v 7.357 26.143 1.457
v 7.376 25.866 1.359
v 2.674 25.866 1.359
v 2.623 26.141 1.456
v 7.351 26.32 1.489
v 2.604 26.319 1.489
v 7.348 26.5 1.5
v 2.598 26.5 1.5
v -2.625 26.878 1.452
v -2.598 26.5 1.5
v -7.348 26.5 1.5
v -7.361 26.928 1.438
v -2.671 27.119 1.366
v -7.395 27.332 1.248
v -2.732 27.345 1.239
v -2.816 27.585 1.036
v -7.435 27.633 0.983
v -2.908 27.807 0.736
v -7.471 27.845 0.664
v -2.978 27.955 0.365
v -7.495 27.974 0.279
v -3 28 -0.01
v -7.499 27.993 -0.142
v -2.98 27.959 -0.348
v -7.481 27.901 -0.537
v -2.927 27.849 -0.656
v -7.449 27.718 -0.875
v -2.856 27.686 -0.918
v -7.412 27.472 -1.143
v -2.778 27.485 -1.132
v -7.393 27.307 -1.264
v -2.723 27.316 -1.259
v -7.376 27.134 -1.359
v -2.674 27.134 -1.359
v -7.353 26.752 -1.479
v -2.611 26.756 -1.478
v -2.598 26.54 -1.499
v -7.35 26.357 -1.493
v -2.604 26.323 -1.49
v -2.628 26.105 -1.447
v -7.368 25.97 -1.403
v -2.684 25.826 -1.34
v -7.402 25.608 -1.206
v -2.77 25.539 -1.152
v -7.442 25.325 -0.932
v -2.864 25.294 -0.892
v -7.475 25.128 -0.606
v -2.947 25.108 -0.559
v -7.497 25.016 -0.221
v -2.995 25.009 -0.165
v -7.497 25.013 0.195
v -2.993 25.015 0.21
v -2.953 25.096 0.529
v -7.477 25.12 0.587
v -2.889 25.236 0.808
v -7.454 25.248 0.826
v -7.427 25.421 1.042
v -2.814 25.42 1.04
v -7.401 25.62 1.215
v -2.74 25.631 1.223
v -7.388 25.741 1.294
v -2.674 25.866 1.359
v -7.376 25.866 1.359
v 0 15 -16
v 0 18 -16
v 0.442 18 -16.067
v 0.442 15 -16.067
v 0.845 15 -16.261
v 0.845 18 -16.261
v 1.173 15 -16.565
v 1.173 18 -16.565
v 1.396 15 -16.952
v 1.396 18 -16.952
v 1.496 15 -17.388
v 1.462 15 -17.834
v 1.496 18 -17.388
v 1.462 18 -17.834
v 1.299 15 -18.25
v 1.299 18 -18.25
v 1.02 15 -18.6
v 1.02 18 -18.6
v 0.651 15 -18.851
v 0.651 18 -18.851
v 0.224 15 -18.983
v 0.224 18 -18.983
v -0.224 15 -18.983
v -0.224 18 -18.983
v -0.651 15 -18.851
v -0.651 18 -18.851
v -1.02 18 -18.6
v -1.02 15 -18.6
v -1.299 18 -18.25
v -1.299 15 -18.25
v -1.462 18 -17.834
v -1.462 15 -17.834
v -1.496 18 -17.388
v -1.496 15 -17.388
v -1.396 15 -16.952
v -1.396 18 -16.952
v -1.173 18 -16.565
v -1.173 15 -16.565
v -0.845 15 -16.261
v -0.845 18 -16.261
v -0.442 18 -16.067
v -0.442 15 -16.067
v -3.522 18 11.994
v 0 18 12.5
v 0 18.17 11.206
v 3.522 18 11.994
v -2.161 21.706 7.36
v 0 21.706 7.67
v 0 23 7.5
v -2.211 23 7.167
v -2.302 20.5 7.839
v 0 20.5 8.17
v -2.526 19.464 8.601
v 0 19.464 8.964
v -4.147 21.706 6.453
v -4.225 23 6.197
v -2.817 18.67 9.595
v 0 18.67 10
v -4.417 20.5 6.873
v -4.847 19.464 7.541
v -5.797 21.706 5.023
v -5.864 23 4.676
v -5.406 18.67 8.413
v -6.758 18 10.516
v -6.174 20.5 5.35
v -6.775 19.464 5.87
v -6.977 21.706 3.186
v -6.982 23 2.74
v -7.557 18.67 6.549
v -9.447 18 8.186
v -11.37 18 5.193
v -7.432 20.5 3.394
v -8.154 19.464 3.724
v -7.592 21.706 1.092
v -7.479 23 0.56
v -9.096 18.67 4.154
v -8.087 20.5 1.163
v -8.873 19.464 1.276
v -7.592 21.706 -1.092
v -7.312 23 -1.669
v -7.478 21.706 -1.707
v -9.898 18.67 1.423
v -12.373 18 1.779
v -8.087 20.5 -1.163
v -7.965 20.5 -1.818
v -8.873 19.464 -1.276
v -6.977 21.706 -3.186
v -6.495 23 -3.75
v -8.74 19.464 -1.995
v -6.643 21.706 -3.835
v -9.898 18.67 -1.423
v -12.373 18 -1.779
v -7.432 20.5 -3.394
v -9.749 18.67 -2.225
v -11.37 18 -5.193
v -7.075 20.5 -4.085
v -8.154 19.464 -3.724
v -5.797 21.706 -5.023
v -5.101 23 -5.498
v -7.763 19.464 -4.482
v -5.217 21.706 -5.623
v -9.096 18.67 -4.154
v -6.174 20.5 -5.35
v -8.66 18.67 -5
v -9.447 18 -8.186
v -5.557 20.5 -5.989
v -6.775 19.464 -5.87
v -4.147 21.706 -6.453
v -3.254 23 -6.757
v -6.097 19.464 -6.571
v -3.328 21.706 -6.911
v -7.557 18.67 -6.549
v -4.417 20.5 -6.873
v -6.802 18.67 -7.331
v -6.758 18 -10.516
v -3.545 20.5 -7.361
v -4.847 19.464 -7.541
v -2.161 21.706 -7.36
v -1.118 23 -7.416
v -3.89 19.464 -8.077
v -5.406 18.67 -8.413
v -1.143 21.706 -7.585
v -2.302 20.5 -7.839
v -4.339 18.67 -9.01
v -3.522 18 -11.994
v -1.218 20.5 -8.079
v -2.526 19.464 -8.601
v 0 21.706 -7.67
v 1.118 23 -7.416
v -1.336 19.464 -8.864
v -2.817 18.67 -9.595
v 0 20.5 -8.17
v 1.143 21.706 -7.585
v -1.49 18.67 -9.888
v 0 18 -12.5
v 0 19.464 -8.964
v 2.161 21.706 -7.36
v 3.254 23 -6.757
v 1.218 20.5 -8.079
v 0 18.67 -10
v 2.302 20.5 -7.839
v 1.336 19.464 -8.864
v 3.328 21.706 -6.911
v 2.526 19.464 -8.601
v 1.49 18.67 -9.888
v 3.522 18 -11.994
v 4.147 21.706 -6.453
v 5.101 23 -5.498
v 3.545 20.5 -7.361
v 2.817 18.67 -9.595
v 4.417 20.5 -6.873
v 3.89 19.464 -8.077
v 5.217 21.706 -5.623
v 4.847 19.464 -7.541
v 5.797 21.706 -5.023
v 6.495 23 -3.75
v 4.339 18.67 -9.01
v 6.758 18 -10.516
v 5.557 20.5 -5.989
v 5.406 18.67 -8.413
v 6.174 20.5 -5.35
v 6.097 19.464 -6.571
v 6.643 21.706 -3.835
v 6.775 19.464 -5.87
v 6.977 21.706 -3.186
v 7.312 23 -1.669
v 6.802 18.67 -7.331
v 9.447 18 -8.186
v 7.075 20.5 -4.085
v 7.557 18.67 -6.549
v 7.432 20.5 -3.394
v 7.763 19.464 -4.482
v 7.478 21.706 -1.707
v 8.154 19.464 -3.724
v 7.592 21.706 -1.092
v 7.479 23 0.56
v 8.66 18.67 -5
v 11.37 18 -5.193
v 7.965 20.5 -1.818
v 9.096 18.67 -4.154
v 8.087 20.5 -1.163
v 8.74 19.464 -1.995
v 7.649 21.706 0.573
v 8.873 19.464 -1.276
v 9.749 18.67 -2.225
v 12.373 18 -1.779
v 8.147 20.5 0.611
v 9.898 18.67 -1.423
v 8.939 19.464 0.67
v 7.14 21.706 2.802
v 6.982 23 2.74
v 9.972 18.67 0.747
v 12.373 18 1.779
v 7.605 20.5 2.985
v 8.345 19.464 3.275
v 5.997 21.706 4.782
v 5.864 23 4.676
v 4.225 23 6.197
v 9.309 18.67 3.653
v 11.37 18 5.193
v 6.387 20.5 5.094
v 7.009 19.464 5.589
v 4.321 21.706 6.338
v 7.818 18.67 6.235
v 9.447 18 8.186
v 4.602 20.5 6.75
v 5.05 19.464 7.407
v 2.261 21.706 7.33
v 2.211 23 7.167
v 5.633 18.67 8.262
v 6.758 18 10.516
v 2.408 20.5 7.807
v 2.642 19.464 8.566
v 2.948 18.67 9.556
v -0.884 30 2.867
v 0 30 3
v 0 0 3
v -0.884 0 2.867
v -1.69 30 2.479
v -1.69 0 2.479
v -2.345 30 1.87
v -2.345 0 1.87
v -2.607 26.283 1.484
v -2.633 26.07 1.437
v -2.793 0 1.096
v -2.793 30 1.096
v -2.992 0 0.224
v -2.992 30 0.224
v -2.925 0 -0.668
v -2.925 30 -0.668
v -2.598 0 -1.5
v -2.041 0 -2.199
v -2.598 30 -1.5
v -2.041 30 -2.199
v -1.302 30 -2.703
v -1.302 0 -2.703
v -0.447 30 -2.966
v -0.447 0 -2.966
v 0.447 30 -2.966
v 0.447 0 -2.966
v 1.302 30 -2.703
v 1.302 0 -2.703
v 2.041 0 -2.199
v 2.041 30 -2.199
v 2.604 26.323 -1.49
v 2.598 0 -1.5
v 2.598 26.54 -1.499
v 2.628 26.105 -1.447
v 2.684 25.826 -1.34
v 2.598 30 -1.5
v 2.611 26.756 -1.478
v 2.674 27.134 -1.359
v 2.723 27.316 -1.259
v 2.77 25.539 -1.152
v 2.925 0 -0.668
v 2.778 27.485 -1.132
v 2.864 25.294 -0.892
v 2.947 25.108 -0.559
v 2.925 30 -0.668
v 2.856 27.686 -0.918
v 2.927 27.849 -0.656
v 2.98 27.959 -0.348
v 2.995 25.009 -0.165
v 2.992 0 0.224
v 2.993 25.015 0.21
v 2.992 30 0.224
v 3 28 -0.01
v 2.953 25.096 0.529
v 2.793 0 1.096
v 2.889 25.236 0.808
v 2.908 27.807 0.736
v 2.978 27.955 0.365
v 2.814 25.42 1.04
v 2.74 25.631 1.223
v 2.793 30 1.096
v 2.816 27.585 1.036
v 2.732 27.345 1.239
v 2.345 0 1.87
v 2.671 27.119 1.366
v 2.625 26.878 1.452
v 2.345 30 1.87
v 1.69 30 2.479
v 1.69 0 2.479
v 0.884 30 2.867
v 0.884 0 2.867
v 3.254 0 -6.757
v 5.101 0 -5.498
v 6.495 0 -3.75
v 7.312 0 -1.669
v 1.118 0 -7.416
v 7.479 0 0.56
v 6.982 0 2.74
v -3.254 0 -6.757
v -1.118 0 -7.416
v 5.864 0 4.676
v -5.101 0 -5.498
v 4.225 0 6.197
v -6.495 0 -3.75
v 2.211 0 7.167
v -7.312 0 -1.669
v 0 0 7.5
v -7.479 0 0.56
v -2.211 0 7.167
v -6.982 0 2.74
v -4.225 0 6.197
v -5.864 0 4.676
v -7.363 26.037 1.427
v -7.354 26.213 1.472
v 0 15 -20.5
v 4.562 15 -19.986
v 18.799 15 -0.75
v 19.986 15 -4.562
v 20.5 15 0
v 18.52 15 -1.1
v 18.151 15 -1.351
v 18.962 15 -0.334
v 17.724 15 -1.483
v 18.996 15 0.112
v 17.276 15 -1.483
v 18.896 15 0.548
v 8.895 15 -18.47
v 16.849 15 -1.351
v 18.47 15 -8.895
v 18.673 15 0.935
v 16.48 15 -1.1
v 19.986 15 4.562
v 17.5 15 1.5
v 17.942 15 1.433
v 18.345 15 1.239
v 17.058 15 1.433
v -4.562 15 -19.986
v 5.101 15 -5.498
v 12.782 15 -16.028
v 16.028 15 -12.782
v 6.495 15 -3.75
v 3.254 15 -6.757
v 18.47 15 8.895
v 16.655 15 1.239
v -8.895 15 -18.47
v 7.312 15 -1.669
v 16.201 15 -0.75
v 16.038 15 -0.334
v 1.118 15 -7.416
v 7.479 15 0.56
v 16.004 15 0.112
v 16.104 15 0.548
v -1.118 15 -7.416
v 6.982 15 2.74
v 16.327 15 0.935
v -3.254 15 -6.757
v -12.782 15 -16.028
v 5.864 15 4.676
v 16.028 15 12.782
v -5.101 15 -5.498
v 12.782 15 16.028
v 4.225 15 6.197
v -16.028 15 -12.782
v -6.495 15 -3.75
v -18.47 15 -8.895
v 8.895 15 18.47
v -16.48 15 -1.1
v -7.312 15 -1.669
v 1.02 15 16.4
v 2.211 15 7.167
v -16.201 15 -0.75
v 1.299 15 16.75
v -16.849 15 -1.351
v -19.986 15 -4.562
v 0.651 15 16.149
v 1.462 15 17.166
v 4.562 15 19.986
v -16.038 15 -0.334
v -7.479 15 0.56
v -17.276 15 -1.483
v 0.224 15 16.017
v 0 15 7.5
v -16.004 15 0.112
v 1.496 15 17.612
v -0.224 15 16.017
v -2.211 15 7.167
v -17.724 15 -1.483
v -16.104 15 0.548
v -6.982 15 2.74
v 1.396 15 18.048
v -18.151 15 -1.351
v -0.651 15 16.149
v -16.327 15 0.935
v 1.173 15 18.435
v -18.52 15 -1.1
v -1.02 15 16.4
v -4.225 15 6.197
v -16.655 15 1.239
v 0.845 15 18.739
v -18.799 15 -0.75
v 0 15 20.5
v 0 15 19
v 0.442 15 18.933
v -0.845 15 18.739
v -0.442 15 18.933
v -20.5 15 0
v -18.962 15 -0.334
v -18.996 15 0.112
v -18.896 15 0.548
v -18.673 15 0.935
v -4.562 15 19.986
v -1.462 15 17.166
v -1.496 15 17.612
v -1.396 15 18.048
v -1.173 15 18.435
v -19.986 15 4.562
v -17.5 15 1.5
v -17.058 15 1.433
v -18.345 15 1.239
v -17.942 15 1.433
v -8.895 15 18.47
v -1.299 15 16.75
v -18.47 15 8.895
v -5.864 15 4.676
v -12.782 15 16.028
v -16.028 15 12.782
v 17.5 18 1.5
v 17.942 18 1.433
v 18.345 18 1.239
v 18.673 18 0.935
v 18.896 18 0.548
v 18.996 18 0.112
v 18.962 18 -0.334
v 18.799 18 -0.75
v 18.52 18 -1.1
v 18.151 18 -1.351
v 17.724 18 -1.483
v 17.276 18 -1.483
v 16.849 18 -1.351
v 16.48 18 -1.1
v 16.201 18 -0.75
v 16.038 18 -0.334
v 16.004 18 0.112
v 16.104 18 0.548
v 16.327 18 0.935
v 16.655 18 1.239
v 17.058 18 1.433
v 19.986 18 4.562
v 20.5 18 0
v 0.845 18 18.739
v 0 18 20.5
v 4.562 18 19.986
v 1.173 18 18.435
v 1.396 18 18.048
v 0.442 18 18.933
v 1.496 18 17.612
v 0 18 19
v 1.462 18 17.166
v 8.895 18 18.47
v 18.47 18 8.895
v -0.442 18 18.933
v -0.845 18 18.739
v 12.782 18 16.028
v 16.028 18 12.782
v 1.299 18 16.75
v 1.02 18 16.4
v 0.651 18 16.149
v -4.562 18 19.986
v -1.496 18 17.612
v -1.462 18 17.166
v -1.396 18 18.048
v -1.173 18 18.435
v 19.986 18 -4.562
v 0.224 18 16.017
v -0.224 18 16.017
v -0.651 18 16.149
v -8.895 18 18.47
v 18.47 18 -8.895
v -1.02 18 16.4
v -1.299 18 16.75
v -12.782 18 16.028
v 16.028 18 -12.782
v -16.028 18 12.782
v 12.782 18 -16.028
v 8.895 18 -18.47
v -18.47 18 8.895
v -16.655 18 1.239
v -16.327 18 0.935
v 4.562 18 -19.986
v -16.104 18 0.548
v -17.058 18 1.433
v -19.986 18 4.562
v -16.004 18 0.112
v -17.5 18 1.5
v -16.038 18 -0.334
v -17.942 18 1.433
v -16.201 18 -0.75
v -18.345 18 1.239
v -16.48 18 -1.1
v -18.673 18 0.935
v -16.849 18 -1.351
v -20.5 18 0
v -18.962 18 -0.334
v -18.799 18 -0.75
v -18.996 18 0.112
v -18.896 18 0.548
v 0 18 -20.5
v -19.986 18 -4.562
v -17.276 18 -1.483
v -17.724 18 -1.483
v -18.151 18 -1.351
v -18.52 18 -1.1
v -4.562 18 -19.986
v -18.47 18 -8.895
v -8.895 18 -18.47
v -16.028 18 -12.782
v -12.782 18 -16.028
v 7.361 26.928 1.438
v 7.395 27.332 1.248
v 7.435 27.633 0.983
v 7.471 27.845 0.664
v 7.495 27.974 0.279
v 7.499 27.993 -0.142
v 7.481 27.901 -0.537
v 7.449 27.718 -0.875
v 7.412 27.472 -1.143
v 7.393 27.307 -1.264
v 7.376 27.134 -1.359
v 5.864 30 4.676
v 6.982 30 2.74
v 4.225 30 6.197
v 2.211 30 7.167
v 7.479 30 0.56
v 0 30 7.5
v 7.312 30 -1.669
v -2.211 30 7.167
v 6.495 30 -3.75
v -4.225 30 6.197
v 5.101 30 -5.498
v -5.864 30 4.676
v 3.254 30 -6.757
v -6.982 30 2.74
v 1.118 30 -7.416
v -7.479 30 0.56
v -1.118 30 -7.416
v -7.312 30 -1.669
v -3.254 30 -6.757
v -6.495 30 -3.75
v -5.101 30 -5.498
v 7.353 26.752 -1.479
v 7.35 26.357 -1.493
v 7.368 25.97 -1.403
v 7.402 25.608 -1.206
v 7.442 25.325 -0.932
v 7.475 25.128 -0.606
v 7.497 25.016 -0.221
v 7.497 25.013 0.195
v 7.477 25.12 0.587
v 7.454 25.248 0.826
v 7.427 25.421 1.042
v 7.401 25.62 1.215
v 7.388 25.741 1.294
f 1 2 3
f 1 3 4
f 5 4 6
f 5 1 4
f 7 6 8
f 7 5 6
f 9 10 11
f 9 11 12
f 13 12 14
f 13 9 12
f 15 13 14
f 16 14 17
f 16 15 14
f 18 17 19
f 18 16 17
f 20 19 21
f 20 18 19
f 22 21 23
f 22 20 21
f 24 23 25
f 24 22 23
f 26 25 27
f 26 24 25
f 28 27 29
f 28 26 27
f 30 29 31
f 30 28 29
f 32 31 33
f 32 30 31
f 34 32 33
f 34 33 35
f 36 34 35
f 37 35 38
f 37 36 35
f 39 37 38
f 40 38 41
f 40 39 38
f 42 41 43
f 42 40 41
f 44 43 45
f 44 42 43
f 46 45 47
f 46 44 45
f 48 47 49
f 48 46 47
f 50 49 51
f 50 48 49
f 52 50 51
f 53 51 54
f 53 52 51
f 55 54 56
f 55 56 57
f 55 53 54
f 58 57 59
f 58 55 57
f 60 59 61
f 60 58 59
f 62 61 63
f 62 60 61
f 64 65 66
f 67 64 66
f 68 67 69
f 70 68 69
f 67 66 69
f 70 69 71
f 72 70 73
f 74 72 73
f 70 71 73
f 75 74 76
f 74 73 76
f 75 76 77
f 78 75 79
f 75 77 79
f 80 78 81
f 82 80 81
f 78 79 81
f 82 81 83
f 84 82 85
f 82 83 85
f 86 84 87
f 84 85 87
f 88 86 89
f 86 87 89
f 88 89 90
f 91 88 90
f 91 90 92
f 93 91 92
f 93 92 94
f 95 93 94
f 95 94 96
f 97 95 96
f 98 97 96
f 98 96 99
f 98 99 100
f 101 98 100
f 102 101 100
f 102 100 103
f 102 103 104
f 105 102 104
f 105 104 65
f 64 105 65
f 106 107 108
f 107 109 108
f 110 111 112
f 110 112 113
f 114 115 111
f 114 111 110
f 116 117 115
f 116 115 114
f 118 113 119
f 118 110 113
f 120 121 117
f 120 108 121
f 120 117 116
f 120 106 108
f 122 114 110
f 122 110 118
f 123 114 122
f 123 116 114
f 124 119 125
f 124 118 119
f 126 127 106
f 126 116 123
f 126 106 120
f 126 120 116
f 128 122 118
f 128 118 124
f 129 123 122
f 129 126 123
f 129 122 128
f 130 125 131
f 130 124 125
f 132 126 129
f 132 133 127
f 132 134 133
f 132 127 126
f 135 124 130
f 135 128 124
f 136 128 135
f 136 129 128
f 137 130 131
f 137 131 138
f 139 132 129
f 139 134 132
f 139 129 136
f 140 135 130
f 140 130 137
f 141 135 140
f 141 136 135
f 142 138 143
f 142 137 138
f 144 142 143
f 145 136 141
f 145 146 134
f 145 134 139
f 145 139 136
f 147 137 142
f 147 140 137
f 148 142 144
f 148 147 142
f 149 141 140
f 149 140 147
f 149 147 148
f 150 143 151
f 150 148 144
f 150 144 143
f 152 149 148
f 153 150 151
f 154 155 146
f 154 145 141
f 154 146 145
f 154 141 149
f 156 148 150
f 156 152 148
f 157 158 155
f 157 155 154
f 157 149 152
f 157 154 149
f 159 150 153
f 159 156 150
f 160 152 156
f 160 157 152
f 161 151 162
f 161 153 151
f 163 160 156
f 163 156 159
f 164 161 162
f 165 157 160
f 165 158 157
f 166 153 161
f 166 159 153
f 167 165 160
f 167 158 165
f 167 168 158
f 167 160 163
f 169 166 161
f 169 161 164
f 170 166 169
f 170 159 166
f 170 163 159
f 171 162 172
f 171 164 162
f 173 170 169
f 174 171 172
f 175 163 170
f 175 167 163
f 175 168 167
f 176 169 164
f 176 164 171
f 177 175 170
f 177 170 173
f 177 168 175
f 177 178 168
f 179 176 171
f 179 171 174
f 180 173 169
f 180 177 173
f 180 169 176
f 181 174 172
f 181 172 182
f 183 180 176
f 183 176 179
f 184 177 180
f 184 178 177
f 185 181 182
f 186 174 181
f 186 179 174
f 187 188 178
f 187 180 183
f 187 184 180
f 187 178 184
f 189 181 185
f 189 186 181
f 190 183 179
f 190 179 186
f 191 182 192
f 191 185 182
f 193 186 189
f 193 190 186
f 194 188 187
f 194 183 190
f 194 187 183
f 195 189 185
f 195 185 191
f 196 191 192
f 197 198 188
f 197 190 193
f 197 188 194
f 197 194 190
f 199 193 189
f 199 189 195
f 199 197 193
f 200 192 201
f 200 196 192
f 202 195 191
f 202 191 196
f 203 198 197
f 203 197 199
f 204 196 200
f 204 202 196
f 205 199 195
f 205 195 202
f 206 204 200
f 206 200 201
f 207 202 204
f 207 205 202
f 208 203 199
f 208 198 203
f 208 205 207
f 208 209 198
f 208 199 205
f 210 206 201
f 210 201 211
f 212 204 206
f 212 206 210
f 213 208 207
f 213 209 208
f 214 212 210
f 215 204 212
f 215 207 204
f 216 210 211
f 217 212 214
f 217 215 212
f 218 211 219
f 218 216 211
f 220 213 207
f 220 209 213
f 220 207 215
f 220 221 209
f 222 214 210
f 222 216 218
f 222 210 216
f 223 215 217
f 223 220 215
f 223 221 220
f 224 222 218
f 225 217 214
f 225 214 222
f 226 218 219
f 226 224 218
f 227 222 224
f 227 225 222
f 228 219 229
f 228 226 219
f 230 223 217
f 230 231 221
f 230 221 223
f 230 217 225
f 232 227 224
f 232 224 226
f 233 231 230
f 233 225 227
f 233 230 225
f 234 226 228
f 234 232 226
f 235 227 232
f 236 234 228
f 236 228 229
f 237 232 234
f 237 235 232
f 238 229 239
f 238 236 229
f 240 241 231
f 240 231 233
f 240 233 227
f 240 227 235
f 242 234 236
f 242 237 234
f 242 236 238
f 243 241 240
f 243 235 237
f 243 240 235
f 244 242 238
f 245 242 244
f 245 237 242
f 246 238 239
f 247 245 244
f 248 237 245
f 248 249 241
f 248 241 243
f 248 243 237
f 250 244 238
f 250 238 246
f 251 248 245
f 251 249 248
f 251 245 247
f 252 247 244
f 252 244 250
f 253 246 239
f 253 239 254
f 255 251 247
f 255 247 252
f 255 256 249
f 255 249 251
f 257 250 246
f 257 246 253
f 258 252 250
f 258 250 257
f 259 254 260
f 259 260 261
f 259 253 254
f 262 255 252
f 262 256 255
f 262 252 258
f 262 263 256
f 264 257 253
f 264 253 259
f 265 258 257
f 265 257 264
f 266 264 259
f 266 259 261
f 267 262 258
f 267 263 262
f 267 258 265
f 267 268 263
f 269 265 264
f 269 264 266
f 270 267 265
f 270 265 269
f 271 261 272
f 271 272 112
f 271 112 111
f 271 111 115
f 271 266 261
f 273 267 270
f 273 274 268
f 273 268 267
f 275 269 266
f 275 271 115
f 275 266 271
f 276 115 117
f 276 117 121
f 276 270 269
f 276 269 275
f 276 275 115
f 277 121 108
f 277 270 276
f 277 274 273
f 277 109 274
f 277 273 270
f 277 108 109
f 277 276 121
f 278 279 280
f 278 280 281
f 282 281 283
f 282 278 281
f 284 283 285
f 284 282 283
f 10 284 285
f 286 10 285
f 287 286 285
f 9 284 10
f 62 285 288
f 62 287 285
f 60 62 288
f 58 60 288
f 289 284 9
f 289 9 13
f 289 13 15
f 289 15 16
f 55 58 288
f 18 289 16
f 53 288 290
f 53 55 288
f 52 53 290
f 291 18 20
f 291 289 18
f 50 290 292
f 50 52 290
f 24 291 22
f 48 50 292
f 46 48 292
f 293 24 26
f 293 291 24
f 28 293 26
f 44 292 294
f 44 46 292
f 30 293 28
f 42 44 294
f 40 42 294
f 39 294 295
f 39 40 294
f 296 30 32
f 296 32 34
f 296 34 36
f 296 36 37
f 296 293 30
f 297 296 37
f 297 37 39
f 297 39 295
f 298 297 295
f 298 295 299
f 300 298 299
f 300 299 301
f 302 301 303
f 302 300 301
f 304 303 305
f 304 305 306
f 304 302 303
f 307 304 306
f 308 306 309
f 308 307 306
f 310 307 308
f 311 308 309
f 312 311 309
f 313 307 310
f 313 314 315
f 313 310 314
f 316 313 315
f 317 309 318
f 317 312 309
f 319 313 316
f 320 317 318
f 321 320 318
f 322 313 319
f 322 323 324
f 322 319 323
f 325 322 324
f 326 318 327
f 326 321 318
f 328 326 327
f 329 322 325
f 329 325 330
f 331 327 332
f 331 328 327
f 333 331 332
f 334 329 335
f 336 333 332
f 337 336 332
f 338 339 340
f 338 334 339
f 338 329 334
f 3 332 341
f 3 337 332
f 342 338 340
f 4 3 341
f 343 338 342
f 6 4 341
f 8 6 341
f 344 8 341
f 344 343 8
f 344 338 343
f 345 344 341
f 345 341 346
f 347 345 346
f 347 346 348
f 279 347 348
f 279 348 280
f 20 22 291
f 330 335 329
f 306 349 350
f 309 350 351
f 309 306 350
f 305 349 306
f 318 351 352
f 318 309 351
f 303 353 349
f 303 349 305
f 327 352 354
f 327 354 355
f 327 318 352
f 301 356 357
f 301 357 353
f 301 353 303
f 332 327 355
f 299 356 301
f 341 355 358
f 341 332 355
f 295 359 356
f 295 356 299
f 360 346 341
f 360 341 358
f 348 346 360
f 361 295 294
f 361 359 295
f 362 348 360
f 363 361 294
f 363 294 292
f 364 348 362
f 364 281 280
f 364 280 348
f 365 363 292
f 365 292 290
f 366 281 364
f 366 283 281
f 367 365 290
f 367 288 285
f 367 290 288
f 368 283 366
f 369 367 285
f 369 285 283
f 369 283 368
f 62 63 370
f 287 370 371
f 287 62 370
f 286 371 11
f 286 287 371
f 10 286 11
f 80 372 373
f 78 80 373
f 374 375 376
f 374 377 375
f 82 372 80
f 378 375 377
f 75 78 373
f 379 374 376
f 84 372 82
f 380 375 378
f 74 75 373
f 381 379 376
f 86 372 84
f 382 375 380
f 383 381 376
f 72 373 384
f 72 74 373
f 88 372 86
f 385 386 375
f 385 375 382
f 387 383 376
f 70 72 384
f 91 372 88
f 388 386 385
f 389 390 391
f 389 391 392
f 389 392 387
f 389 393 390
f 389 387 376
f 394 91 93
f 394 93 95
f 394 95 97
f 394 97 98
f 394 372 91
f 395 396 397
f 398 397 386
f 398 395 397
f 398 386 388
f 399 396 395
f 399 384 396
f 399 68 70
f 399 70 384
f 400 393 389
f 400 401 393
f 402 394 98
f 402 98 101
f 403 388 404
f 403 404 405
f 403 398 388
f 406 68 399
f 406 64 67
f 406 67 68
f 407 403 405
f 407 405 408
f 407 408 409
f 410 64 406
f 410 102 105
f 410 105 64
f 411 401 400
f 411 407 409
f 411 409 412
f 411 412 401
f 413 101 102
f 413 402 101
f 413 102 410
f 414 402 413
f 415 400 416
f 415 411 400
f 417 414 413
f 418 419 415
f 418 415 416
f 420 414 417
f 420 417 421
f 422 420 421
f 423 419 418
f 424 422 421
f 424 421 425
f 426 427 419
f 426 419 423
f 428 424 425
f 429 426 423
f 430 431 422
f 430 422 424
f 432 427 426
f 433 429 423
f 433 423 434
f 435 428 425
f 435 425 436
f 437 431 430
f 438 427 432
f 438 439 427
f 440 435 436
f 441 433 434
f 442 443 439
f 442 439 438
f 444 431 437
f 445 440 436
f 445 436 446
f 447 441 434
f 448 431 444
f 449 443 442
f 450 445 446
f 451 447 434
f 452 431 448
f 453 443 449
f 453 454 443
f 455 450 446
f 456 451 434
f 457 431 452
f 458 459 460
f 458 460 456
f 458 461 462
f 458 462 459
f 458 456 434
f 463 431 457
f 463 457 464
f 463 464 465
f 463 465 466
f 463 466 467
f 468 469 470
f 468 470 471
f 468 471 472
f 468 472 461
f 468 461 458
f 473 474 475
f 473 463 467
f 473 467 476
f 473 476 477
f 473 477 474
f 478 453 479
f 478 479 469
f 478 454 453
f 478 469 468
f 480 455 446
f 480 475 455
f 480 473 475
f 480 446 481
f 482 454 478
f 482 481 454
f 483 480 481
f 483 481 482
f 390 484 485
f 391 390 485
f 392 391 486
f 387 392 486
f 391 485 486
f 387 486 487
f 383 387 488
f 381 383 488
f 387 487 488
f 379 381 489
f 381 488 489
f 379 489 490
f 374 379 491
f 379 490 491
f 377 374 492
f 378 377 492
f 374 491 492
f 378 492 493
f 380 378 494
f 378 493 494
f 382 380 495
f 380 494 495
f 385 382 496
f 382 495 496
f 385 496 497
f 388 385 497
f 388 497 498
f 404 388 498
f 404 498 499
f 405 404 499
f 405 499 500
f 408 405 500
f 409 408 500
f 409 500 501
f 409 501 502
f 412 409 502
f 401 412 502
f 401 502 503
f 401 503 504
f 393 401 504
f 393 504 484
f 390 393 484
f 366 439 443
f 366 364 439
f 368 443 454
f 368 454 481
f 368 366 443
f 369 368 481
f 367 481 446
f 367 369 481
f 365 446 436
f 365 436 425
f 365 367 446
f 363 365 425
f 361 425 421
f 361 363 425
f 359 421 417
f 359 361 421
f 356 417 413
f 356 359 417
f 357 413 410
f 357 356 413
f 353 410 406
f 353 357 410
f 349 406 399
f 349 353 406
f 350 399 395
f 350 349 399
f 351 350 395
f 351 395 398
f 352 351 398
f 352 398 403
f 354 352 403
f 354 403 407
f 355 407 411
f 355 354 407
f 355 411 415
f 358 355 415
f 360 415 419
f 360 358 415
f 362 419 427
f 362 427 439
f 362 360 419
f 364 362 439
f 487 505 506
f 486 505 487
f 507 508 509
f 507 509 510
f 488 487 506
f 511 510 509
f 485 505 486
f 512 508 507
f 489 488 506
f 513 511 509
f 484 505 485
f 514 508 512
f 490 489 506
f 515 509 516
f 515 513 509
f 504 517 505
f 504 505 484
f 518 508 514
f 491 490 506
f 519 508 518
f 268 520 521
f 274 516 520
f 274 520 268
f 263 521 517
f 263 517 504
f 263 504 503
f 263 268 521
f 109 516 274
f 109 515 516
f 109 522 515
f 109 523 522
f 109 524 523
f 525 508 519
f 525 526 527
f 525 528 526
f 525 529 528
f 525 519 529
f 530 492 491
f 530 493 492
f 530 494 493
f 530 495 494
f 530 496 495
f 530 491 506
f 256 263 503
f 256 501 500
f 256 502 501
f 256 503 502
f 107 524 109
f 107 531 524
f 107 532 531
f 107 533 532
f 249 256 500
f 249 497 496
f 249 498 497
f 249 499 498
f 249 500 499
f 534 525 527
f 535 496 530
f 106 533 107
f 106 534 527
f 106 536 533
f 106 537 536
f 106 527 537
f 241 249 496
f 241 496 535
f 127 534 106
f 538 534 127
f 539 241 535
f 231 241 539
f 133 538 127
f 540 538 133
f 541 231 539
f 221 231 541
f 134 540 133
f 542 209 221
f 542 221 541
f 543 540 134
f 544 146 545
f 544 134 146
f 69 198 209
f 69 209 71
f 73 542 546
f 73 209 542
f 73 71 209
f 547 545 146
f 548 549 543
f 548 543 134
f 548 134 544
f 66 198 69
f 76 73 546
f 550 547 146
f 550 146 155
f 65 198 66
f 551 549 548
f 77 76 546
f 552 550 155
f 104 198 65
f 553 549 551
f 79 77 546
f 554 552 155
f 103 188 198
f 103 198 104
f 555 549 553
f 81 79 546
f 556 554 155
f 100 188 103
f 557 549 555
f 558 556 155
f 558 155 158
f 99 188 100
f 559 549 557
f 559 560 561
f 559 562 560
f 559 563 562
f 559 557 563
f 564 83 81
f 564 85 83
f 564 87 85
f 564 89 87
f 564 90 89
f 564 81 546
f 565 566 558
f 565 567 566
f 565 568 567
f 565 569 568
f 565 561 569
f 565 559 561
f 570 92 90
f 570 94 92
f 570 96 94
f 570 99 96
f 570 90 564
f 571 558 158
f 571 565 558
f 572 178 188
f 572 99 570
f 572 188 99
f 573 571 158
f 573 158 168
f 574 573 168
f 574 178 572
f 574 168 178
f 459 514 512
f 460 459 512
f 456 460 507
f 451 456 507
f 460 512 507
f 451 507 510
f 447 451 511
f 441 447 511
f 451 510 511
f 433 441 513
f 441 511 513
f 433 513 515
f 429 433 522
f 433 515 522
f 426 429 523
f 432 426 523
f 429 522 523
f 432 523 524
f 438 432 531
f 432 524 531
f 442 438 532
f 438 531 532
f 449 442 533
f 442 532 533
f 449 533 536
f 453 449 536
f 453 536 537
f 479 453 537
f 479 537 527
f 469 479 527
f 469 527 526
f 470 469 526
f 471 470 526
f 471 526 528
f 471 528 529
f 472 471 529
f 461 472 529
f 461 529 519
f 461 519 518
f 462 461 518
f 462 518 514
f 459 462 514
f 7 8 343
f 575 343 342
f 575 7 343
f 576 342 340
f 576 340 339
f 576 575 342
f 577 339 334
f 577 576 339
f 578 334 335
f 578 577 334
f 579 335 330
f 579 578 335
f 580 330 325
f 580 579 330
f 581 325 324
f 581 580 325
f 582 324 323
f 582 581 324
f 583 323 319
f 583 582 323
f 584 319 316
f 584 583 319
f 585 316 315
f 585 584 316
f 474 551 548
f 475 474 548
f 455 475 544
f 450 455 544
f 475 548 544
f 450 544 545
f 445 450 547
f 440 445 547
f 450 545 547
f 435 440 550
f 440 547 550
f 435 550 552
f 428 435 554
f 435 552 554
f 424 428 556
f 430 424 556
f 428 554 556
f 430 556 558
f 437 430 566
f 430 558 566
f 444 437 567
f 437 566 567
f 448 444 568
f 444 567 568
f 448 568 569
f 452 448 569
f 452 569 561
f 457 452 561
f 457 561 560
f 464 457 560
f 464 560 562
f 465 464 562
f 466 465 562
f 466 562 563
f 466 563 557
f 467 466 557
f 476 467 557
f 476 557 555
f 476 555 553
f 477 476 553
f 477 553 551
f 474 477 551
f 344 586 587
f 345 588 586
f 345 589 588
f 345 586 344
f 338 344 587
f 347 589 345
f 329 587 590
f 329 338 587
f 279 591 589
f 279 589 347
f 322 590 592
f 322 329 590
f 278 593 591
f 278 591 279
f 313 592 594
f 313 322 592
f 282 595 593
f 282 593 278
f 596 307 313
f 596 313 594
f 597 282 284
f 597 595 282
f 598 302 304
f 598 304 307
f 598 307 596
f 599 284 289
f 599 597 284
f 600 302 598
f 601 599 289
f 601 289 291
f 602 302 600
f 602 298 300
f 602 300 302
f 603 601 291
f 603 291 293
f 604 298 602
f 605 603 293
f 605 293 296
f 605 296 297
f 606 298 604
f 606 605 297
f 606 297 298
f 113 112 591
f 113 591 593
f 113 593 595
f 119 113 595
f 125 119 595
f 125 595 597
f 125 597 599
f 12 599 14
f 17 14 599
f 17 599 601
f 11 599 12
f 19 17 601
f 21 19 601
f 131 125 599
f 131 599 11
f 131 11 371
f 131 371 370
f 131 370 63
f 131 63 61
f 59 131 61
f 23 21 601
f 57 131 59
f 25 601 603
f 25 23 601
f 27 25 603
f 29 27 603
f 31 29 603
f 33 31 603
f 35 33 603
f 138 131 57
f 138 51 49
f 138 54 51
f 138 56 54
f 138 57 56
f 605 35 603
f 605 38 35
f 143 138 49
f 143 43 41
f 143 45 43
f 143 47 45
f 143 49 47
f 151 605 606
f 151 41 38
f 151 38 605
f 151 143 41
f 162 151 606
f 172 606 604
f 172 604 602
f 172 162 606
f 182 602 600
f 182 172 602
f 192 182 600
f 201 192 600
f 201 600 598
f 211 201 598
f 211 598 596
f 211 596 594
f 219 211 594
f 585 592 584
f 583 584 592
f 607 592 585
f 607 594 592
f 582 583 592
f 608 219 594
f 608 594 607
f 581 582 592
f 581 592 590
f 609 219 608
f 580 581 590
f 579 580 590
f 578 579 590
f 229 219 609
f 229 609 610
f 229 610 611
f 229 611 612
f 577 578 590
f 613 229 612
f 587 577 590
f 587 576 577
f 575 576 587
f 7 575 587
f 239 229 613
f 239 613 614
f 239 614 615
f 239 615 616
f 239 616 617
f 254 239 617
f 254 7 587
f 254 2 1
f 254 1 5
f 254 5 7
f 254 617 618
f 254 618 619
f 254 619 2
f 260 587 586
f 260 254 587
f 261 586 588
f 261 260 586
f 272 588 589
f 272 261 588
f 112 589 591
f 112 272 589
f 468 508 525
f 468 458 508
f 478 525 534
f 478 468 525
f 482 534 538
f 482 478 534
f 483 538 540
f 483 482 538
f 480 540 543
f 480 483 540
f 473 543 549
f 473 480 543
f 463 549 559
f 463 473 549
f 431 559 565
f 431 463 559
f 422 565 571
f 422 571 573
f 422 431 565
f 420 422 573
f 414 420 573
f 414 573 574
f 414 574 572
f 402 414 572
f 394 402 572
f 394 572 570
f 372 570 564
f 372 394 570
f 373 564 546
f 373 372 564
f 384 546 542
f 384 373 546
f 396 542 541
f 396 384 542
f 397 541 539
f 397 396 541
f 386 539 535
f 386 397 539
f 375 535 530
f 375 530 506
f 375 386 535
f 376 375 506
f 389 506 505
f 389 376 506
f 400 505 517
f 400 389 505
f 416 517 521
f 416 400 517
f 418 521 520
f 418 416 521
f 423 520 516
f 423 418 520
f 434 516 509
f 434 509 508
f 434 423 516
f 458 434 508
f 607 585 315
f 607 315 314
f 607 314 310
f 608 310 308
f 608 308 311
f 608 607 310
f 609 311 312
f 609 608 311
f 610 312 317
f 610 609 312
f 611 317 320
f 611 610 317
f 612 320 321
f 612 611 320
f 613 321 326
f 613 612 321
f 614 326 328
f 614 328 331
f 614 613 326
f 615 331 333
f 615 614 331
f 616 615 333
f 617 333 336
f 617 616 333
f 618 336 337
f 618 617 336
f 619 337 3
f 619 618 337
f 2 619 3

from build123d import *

# Parameters (mm, degrees)
FILLET1_R               = 5
SKETCH3_R               = 1.5
CUT_EXTRUDE2_DEPTH      = 35.124771062
CUT_EXTRUDE3_DEPTH      = 46.872104813
CUT_EXTRUDE3_DEPTH_BACK = 46.872104813


with BuildPart() as part:
    # Sketch2 → Revolve1 (revolve)
    with BuildSketch(Plane.XY, mode=Mode.PRIVATE) as revolve1_sk:
        Polygon((7.5, 30), (7.5, 18), (20.5, 18), (20.5, 15), (7.5, 15), (7.5, 0), (3, 0), (3, 30), align=None)
    revolve(revolve1_sk.sketch.rotate(Axis((0, 9.767689721, 0), (0, -1, 0)), 90), axis=Axis((0, 9.767689721, 0), (0, -1, 0)))

    # Fillet1
    fillet1_edges = [part.edges().sort_by_distance(p)[0] for p in [
        (0, 18, -7.5),
    ]]
    fillet(fillet1_edges, radius=FILLET1_R)

    # Sketch3 → Cut-Extrude2 (cut, through all)
    with BuildSketch(Plane(origin=(0, 18, 0), x_dir=(1, 0, 0), z_dir=(0, 1, 0))):
        with Locations(Location((0, 17.5, 0), (0, 0, 270))):
            Circle(SKETCH3_R)
        with Locations(Location((17.5, 0, 0), (0, 0, 270))):
            Circle(SKETCH3_R)
        with Locations(Location((0, -17.5, 0), (0, 0, 270))):
            Circle(SKETCH3_R)
        with Locations(Location((-17.5, 0, 0), (0, 0, 270))):
            Circle(SKETCH3_R)
    extrude(amount=-CUT_EXTRUDE2_DEPTH, mode=Mode.SUBTRACT)

    # Sketch4 → Cut-Extrude3 (cut, two sides: drawn at the far end of the back side and taken through both)
    with BuildSketch(Plane.ZY.offset(7.5).offset(-CUT_EXTRUDE3_DEPTH_BACK)):
        with BuildLine():
            ThreePointArc((1.5, 26.5), (0.324875311, 27.964396132), (-1.35927471, 27.134328198))
            Line((-1.35927471, 27.134328198), (1.35927471, 25.865671802))
            ThreePointArc((1.35927471, 25.865671802), (1.464396132, 26.175124689), (1.5, 26.5))
        make_face()
        with BuildLine():
            Line((1.35927471, 25.865671802), (-1.35927471, 27.134328198))
            ThreePointArc((-1.35927471, 27.134328198), (-0.634328198, 25.14072529), (1.35927471, 25.865671802))
        make_face()
    extrude(amount=CUT_EXTRUDE3_DEPTH + CUT_EXTRUDE3_DEPTH_BACK, mode=Mode.SUBTRACT)


solid = part.part
